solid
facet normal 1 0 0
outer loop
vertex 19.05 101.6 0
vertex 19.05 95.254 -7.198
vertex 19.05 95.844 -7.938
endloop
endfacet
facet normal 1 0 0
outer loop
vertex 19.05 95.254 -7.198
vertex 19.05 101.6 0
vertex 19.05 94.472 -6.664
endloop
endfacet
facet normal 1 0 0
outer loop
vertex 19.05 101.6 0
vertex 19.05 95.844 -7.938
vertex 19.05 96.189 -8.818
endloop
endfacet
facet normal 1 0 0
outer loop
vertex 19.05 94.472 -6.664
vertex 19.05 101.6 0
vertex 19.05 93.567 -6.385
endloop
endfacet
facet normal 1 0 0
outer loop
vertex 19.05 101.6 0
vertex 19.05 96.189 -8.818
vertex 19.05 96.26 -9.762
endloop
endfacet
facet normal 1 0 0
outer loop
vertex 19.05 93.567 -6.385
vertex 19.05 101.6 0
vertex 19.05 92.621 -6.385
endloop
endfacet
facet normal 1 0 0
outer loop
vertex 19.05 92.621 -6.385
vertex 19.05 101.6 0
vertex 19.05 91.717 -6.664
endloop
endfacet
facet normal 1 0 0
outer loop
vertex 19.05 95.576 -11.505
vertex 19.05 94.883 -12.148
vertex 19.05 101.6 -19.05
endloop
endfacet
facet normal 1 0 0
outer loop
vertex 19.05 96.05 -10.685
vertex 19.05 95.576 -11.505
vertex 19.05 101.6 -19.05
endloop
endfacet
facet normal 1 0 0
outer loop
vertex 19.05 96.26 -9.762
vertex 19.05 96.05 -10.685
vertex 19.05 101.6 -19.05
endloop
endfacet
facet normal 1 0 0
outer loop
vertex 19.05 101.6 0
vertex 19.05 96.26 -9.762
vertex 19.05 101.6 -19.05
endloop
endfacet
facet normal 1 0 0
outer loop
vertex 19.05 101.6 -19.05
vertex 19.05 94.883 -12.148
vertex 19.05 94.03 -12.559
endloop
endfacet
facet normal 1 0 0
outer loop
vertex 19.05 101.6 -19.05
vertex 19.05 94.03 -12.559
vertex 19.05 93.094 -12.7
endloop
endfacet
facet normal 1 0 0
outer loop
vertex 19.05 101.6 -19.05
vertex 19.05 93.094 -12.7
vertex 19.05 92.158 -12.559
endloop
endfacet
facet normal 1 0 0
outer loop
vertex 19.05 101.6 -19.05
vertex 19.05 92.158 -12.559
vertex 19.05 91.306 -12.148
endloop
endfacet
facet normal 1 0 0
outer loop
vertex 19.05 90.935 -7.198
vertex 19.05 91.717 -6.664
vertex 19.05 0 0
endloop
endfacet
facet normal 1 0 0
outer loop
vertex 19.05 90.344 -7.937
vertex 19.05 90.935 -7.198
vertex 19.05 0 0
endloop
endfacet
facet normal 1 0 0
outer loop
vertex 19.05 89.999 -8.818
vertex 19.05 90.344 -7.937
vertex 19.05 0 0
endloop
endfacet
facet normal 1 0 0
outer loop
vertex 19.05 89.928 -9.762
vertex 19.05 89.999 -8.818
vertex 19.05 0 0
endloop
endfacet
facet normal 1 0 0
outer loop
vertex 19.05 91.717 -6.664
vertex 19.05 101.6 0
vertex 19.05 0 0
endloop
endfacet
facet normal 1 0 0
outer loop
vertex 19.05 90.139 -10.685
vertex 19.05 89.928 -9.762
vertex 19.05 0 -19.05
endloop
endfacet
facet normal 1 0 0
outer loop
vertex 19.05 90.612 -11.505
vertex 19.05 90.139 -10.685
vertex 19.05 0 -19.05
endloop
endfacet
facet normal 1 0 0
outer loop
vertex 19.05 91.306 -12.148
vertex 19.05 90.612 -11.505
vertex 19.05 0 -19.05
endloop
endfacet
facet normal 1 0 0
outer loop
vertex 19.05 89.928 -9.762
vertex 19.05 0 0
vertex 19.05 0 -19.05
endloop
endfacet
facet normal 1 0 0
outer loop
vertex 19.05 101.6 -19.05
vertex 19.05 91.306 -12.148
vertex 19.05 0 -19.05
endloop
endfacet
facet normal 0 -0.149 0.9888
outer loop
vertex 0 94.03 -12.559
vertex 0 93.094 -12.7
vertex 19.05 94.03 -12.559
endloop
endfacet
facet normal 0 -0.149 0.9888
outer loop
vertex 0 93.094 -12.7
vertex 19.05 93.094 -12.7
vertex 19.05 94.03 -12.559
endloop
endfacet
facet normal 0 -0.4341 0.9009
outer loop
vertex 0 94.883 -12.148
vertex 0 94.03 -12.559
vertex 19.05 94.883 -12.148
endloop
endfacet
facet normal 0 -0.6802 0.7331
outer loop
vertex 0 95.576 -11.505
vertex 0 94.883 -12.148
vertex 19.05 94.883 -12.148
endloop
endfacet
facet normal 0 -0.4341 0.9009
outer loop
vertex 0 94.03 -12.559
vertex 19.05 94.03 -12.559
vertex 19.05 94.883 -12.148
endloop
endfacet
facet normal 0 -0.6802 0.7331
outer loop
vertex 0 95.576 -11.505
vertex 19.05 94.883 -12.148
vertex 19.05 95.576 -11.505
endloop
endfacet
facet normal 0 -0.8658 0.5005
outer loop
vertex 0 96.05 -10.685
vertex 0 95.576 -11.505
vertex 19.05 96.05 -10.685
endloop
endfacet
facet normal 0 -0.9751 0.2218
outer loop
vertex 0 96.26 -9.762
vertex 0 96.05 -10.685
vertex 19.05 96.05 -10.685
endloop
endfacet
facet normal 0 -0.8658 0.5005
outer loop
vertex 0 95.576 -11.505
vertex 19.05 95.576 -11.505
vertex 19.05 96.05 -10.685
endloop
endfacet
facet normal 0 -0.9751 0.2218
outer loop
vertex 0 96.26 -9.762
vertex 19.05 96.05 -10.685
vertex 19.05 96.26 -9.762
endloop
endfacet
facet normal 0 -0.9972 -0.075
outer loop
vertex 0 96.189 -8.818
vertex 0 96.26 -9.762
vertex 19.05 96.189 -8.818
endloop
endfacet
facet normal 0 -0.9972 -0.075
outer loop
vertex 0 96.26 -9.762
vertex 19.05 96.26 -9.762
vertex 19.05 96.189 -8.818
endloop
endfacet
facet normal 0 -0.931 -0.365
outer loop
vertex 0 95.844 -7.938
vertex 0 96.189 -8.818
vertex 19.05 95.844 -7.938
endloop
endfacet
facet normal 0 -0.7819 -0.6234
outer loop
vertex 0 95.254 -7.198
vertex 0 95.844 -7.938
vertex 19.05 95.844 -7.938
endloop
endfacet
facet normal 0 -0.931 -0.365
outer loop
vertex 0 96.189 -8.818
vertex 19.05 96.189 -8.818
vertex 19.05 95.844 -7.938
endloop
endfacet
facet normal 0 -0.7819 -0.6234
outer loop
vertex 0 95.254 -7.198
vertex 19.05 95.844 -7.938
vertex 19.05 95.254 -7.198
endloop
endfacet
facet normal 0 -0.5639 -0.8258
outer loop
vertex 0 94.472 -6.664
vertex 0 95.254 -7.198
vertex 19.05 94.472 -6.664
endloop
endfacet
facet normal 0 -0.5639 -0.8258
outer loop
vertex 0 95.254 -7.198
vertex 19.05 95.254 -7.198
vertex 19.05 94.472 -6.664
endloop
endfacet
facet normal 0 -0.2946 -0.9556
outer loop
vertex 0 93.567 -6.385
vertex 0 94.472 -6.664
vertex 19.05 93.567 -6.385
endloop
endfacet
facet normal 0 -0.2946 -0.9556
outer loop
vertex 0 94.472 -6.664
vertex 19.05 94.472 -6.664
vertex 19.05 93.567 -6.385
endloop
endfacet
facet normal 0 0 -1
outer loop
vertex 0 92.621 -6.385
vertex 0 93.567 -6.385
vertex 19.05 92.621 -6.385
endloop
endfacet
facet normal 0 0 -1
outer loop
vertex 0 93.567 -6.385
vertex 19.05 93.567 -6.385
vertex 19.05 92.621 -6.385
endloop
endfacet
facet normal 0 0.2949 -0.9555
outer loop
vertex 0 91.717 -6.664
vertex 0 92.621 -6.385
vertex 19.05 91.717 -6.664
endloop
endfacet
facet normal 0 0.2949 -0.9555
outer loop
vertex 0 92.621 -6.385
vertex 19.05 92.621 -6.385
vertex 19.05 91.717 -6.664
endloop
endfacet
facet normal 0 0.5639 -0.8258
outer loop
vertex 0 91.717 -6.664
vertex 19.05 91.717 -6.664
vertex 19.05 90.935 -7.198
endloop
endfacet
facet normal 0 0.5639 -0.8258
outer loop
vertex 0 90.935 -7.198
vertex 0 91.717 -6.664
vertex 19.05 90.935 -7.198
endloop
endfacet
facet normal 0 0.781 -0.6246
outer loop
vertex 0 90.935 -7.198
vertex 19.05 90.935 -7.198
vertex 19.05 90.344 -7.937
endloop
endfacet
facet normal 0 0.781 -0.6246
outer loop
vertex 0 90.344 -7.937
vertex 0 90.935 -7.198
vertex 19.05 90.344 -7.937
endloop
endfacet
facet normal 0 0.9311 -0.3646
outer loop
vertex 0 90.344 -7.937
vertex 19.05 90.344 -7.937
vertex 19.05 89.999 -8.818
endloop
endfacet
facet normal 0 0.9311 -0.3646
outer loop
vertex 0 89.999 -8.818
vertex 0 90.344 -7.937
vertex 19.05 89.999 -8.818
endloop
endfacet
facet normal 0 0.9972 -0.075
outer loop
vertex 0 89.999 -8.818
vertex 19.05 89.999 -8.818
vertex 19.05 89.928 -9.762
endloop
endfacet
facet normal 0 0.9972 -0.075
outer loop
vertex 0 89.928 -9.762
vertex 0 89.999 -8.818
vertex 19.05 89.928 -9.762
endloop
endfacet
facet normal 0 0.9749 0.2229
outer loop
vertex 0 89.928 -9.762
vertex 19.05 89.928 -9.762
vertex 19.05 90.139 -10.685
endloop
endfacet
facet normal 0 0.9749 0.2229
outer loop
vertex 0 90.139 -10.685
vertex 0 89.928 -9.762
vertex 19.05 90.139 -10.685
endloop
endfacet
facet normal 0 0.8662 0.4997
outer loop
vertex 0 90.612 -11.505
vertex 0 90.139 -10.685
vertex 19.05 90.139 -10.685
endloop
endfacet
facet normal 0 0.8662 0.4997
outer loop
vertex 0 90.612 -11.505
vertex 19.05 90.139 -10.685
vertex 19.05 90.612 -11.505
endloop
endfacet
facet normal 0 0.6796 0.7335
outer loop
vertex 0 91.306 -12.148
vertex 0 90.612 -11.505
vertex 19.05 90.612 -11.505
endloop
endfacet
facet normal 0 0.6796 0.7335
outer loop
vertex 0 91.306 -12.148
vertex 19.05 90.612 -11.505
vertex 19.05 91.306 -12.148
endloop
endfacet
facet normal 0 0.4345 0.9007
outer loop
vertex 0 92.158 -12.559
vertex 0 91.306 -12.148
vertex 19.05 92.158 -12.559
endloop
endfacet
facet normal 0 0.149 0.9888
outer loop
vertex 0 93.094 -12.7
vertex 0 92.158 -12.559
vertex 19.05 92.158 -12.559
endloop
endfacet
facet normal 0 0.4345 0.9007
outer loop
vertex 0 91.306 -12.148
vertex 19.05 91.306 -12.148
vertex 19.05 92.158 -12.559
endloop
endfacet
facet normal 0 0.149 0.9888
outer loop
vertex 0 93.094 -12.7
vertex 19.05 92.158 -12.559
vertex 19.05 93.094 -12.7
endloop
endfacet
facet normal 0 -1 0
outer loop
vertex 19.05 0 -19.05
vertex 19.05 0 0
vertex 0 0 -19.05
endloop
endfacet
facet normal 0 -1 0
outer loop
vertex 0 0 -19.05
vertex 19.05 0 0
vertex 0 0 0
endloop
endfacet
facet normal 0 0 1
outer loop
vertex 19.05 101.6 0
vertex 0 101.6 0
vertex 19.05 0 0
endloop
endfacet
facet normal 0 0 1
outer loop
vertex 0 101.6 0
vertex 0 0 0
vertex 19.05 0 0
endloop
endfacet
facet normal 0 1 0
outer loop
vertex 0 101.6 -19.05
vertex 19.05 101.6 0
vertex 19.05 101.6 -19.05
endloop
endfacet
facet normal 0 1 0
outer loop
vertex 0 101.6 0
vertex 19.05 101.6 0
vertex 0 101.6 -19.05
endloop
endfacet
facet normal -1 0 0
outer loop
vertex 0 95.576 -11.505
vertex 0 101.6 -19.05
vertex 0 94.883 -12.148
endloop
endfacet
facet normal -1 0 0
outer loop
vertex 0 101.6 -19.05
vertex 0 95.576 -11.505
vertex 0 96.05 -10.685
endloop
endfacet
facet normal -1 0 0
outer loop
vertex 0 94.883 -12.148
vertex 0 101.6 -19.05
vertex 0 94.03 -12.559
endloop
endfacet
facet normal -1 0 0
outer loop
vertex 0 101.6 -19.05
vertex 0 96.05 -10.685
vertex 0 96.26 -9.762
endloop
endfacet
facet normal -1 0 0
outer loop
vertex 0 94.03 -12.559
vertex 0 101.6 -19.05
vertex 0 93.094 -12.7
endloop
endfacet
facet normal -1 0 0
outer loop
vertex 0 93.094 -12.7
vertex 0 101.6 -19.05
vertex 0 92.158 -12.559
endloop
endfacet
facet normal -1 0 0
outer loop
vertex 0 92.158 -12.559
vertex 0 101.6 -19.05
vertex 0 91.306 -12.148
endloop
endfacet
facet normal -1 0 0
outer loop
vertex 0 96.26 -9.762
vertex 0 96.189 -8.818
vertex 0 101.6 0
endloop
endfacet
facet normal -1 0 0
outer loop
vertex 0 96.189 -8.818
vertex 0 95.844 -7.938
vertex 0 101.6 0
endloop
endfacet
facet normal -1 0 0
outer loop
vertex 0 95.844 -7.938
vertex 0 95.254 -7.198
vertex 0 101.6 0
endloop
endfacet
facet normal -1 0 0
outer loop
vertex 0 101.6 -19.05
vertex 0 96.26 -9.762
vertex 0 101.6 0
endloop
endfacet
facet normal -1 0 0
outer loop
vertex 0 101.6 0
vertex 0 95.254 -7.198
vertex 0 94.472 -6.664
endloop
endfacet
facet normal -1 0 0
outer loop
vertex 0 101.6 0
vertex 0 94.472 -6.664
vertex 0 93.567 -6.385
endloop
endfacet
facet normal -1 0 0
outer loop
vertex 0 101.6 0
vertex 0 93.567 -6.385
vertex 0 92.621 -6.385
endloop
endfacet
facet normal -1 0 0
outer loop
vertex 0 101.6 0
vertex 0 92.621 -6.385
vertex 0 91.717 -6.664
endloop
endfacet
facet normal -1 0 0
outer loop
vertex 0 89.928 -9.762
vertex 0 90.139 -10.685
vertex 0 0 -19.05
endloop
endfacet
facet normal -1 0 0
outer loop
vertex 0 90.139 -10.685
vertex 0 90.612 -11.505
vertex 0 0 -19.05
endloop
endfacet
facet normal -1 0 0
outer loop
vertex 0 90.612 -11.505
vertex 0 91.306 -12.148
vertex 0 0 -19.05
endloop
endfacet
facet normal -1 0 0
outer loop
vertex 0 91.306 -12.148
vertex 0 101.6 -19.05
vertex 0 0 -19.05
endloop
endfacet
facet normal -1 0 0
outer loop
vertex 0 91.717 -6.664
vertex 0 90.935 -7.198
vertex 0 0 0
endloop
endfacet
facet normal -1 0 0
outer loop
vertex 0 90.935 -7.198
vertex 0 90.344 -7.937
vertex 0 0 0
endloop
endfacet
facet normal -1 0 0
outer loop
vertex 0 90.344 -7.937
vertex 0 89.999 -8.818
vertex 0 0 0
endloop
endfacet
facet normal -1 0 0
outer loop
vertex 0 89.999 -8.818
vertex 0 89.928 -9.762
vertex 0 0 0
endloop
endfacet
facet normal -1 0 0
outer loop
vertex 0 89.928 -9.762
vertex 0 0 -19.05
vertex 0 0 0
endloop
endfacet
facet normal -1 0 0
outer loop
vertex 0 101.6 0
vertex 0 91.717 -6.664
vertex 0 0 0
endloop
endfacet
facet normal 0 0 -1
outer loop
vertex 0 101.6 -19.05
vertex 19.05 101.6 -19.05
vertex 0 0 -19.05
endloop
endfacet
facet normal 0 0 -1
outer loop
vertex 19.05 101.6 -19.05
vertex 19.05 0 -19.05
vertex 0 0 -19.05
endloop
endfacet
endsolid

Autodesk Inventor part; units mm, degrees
ref_plane "YZ Plane" through (0, 0, 0) normal (1, 0, 0) x (0, 1, 0)
ref_plane "XZ Plane" through (0, 0, 0) normal (0, 1, 0) x (-1, 0, 0)
ref_plane "XY Plane" through (0, 0, 0) normal (0, 0, 1) x (1, 0, 0)
sketch "Sketch1" plane through (0, 0, 0) normal (0, 1, 0) x (-1, 0, 0)
  line L0 (0, 0) -> (-19.05, 0)
  line L1 (-19.05, 0) -> (-19.05, -19.05)
  line L2 (-19.05, -19.05) -> (0, -19.05)
  line L3 (0, -19.05) -> (0, 0)
  dimension "d0" = 19.05
  dimension "d1" = 19.05
extrude "Extrusion1" add sketch "Sketch1" along normal blind 101.6
sketch "Sketch2" plane through (19.05, 0, 0) normal (1, 0, 0) x (0, 0, -1)
  line L0 (0, 101.6) -> (19.05, 101.6) construction
  line L1 (9.525, 101.6) -> (9.525, 0) construction
  line L2 (0, 0) -> (19.05, 0) construction
  line L3 (0, 0) -> (0, 101.6) construction
  line L4 (0, 93.0941) -> (19.4916, 93.0941) construction
  circle A0 centre (9.525, 93.0941) radius 3.175
  dimension "d4" = 6.35
extrude "Extrusion2" cut sketch "Sketch2" against normal through all
properties part number "arm holder mount thing"
